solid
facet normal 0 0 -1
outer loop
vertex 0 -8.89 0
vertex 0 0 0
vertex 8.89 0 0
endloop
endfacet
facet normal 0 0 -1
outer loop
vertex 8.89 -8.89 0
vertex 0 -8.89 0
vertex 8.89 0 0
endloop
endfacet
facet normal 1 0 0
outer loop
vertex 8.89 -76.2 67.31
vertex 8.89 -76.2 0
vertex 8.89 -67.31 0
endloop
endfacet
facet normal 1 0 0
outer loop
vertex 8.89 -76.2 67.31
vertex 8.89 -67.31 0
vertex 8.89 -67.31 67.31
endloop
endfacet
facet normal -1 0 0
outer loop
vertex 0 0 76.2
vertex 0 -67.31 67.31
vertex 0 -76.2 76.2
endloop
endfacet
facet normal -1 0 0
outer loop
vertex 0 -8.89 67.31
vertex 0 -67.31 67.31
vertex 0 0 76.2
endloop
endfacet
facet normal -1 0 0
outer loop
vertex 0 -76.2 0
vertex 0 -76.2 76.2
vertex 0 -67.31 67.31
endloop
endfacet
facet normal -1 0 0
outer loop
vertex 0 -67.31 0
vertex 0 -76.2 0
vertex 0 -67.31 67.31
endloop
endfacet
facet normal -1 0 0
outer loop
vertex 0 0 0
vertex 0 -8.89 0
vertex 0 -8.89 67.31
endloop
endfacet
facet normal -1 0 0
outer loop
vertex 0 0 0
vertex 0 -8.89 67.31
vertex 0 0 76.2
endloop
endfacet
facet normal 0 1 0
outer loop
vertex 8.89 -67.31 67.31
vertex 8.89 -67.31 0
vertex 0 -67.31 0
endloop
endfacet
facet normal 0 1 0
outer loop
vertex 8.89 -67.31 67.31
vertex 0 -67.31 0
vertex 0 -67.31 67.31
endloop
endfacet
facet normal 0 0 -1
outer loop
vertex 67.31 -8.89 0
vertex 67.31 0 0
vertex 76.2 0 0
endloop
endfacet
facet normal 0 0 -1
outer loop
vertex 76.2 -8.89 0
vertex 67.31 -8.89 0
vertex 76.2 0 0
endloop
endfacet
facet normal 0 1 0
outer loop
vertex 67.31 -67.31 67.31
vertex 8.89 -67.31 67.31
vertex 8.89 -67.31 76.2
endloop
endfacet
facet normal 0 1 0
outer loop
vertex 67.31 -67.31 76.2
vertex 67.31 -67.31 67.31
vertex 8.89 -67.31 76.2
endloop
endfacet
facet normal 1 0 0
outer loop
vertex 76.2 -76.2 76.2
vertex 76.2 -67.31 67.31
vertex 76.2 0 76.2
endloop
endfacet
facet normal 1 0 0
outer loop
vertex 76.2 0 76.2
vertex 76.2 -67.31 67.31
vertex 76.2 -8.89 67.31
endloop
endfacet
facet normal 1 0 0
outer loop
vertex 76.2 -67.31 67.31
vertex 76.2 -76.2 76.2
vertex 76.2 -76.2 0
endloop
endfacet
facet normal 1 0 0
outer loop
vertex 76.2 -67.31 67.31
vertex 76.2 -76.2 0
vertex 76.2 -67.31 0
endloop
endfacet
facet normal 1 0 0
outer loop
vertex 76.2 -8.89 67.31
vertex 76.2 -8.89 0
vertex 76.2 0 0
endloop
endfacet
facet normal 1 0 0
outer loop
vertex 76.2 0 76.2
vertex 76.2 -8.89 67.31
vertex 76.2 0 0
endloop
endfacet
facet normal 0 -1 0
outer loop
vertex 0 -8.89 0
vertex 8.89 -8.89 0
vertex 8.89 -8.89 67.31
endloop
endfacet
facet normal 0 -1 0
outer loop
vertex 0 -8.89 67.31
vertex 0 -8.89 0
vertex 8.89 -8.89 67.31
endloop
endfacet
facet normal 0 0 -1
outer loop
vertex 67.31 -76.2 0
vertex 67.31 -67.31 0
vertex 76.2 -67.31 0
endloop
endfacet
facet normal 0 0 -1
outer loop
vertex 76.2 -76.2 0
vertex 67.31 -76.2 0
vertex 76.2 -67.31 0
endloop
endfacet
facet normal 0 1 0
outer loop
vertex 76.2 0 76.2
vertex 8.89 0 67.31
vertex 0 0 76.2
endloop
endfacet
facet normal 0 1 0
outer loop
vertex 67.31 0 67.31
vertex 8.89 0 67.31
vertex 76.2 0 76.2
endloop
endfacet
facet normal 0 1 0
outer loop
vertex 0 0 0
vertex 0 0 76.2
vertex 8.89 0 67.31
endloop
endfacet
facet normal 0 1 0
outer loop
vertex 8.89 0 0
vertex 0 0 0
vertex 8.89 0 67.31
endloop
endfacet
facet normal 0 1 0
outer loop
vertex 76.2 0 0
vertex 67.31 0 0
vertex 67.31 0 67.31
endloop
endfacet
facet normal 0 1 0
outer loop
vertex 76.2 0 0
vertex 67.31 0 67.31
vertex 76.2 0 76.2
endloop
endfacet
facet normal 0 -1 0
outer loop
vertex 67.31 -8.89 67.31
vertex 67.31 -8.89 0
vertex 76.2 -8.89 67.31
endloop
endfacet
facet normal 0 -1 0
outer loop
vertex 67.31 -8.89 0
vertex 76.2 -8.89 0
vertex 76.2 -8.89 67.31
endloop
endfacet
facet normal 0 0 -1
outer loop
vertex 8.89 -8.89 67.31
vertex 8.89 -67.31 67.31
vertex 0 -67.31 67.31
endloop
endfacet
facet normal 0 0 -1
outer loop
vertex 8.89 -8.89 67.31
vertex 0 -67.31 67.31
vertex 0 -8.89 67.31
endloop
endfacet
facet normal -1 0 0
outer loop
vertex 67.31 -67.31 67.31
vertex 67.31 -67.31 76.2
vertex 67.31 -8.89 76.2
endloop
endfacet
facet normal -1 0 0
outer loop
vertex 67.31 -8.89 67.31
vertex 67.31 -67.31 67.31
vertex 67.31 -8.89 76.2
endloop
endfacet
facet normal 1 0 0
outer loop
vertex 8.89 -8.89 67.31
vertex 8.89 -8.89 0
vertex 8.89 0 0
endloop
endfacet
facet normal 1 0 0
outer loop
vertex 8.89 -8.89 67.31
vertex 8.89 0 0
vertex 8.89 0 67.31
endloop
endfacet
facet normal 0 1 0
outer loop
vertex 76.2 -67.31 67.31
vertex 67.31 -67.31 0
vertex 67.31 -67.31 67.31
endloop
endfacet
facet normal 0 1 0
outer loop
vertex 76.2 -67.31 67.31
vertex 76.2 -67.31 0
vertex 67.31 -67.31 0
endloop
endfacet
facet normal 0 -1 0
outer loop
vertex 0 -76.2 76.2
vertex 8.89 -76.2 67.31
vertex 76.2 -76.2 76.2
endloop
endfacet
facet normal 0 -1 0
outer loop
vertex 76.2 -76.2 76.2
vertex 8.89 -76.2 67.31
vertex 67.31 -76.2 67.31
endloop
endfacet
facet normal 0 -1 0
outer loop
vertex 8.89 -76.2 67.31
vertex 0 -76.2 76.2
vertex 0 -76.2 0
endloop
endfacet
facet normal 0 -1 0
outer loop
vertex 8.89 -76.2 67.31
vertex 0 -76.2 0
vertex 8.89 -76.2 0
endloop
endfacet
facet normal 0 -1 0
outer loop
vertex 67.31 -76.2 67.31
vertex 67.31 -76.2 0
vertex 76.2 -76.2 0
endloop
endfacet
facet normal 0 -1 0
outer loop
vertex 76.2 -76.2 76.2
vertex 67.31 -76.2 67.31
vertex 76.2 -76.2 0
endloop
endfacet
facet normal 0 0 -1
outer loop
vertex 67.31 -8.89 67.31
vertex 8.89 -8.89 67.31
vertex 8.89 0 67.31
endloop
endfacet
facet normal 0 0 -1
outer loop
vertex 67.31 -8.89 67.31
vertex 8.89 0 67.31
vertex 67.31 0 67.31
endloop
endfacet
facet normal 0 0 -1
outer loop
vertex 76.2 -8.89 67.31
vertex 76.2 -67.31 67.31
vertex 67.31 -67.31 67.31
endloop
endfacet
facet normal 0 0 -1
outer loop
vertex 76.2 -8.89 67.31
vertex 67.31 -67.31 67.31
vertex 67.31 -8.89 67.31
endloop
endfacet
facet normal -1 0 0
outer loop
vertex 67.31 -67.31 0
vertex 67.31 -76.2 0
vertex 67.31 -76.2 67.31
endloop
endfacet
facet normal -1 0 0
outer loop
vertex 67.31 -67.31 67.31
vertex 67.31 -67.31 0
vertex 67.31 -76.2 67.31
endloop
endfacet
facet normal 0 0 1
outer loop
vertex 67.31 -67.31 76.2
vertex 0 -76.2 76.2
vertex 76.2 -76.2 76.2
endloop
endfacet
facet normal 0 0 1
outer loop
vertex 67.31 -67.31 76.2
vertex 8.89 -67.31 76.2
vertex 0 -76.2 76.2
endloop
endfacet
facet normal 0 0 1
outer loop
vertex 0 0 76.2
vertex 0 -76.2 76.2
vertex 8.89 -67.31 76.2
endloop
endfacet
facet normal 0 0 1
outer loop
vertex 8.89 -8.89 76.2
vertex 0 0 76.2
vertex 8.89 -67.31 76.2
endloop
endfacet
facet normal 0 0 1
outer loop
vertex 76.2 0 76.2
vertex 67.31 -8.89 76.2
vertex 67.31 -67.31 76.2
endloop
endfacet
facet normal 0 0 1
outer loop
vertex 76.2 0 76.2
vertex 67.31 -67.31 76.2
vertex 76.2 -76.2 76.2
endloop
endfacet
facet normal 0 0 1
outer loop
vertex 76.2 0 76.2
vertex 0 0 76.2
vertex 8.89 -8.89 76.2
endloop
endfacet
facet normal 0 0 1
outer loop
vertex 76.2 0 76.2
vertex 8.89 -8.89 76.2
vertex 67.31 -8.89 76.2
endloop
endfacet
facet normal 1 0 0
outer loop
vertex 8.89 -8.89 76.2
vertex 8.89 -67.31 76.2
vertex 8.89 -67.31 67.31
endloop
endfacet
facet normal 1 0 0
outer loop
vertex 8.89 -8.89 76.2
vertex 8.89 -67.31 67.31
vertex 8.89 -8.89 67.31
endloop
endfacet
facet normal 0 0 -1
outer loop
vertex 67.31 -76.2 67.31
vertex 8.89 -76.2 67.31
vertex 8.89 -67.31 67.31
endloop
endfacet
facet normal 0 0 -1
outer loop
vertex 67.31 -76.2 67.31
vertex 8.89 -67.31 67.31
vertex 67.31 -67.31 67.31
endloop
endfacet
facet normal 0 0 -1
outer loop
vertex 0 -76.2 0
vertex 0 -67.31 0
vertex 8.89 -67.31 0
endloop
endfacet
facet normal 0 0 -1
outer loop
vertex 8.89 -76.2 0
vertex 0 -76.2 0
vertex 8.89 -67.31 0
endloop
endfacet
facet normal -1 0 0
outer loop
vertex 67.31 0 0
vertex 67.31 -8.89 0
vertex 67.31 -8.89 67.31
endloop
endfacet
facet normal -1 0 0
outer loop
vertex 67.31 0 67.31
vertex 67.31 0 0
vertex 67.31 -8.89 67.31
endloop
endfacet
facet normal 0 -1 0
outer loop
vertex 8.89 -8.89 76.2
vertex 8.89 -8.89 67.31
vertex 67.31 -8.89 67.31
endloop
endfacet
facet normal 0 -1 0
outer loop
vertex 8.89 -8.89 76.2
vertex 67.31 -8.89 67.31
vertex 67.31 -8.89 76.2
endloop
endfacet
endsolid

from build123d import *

# Parameters (mm, degrees)
F0_W     = 76.2
F0_H     = 76.2
F1_DEPTH = 76.2
F2_W     = 58.42
F2_H     = 58.42
F3_DEPTH = 76.2
F4_W     = 58.42
F4_H     = 67.31
F5_DEPTH = 76.2
F6_W     = 58.42
F6_H     = 134.62
F7_DEPTH = 76.2


with BuildPart() as f1:
    # F0 (on Top) → F1 (new body)
    with BuildSketch(Plane.XY):
        with Locations((38.1, -38.1)):
            Rectangle(F0_W, F0_H)
    extrude(amount=F1_DEPTH)

    # F2 (on face) → F3 (cut)
    with BuildSketch(Plane.XY.offset(76.2)):
        with Locations((38.1, -38.1)):
            Rectangle(F2_W, F2_H)
    extrude(amount=-F3_DEPTH, mode=Mode.SUBTRACT)

    # F4 (on face) → F5 (cut)
    with BuildSketch(Plane.YZ.offset(76.2)):
        with Locations((-38.1, 33.655)):
            Rectangle(F4_W, F4_H)
    extrude(amount=-F5_DEPTH, mode=Mode.SUBTRACT)

    # F6 (on face) → F7 (cut)
    with BuildSketch(Plane.XZ.offset(76.2)):
        with Locations((38.1, 0)):
            Rectangle(F6_W, F6_H)
    extrude(amount=-F7_DEPTH, mode=Mode.SUBTRACT)


solid = f1.part
